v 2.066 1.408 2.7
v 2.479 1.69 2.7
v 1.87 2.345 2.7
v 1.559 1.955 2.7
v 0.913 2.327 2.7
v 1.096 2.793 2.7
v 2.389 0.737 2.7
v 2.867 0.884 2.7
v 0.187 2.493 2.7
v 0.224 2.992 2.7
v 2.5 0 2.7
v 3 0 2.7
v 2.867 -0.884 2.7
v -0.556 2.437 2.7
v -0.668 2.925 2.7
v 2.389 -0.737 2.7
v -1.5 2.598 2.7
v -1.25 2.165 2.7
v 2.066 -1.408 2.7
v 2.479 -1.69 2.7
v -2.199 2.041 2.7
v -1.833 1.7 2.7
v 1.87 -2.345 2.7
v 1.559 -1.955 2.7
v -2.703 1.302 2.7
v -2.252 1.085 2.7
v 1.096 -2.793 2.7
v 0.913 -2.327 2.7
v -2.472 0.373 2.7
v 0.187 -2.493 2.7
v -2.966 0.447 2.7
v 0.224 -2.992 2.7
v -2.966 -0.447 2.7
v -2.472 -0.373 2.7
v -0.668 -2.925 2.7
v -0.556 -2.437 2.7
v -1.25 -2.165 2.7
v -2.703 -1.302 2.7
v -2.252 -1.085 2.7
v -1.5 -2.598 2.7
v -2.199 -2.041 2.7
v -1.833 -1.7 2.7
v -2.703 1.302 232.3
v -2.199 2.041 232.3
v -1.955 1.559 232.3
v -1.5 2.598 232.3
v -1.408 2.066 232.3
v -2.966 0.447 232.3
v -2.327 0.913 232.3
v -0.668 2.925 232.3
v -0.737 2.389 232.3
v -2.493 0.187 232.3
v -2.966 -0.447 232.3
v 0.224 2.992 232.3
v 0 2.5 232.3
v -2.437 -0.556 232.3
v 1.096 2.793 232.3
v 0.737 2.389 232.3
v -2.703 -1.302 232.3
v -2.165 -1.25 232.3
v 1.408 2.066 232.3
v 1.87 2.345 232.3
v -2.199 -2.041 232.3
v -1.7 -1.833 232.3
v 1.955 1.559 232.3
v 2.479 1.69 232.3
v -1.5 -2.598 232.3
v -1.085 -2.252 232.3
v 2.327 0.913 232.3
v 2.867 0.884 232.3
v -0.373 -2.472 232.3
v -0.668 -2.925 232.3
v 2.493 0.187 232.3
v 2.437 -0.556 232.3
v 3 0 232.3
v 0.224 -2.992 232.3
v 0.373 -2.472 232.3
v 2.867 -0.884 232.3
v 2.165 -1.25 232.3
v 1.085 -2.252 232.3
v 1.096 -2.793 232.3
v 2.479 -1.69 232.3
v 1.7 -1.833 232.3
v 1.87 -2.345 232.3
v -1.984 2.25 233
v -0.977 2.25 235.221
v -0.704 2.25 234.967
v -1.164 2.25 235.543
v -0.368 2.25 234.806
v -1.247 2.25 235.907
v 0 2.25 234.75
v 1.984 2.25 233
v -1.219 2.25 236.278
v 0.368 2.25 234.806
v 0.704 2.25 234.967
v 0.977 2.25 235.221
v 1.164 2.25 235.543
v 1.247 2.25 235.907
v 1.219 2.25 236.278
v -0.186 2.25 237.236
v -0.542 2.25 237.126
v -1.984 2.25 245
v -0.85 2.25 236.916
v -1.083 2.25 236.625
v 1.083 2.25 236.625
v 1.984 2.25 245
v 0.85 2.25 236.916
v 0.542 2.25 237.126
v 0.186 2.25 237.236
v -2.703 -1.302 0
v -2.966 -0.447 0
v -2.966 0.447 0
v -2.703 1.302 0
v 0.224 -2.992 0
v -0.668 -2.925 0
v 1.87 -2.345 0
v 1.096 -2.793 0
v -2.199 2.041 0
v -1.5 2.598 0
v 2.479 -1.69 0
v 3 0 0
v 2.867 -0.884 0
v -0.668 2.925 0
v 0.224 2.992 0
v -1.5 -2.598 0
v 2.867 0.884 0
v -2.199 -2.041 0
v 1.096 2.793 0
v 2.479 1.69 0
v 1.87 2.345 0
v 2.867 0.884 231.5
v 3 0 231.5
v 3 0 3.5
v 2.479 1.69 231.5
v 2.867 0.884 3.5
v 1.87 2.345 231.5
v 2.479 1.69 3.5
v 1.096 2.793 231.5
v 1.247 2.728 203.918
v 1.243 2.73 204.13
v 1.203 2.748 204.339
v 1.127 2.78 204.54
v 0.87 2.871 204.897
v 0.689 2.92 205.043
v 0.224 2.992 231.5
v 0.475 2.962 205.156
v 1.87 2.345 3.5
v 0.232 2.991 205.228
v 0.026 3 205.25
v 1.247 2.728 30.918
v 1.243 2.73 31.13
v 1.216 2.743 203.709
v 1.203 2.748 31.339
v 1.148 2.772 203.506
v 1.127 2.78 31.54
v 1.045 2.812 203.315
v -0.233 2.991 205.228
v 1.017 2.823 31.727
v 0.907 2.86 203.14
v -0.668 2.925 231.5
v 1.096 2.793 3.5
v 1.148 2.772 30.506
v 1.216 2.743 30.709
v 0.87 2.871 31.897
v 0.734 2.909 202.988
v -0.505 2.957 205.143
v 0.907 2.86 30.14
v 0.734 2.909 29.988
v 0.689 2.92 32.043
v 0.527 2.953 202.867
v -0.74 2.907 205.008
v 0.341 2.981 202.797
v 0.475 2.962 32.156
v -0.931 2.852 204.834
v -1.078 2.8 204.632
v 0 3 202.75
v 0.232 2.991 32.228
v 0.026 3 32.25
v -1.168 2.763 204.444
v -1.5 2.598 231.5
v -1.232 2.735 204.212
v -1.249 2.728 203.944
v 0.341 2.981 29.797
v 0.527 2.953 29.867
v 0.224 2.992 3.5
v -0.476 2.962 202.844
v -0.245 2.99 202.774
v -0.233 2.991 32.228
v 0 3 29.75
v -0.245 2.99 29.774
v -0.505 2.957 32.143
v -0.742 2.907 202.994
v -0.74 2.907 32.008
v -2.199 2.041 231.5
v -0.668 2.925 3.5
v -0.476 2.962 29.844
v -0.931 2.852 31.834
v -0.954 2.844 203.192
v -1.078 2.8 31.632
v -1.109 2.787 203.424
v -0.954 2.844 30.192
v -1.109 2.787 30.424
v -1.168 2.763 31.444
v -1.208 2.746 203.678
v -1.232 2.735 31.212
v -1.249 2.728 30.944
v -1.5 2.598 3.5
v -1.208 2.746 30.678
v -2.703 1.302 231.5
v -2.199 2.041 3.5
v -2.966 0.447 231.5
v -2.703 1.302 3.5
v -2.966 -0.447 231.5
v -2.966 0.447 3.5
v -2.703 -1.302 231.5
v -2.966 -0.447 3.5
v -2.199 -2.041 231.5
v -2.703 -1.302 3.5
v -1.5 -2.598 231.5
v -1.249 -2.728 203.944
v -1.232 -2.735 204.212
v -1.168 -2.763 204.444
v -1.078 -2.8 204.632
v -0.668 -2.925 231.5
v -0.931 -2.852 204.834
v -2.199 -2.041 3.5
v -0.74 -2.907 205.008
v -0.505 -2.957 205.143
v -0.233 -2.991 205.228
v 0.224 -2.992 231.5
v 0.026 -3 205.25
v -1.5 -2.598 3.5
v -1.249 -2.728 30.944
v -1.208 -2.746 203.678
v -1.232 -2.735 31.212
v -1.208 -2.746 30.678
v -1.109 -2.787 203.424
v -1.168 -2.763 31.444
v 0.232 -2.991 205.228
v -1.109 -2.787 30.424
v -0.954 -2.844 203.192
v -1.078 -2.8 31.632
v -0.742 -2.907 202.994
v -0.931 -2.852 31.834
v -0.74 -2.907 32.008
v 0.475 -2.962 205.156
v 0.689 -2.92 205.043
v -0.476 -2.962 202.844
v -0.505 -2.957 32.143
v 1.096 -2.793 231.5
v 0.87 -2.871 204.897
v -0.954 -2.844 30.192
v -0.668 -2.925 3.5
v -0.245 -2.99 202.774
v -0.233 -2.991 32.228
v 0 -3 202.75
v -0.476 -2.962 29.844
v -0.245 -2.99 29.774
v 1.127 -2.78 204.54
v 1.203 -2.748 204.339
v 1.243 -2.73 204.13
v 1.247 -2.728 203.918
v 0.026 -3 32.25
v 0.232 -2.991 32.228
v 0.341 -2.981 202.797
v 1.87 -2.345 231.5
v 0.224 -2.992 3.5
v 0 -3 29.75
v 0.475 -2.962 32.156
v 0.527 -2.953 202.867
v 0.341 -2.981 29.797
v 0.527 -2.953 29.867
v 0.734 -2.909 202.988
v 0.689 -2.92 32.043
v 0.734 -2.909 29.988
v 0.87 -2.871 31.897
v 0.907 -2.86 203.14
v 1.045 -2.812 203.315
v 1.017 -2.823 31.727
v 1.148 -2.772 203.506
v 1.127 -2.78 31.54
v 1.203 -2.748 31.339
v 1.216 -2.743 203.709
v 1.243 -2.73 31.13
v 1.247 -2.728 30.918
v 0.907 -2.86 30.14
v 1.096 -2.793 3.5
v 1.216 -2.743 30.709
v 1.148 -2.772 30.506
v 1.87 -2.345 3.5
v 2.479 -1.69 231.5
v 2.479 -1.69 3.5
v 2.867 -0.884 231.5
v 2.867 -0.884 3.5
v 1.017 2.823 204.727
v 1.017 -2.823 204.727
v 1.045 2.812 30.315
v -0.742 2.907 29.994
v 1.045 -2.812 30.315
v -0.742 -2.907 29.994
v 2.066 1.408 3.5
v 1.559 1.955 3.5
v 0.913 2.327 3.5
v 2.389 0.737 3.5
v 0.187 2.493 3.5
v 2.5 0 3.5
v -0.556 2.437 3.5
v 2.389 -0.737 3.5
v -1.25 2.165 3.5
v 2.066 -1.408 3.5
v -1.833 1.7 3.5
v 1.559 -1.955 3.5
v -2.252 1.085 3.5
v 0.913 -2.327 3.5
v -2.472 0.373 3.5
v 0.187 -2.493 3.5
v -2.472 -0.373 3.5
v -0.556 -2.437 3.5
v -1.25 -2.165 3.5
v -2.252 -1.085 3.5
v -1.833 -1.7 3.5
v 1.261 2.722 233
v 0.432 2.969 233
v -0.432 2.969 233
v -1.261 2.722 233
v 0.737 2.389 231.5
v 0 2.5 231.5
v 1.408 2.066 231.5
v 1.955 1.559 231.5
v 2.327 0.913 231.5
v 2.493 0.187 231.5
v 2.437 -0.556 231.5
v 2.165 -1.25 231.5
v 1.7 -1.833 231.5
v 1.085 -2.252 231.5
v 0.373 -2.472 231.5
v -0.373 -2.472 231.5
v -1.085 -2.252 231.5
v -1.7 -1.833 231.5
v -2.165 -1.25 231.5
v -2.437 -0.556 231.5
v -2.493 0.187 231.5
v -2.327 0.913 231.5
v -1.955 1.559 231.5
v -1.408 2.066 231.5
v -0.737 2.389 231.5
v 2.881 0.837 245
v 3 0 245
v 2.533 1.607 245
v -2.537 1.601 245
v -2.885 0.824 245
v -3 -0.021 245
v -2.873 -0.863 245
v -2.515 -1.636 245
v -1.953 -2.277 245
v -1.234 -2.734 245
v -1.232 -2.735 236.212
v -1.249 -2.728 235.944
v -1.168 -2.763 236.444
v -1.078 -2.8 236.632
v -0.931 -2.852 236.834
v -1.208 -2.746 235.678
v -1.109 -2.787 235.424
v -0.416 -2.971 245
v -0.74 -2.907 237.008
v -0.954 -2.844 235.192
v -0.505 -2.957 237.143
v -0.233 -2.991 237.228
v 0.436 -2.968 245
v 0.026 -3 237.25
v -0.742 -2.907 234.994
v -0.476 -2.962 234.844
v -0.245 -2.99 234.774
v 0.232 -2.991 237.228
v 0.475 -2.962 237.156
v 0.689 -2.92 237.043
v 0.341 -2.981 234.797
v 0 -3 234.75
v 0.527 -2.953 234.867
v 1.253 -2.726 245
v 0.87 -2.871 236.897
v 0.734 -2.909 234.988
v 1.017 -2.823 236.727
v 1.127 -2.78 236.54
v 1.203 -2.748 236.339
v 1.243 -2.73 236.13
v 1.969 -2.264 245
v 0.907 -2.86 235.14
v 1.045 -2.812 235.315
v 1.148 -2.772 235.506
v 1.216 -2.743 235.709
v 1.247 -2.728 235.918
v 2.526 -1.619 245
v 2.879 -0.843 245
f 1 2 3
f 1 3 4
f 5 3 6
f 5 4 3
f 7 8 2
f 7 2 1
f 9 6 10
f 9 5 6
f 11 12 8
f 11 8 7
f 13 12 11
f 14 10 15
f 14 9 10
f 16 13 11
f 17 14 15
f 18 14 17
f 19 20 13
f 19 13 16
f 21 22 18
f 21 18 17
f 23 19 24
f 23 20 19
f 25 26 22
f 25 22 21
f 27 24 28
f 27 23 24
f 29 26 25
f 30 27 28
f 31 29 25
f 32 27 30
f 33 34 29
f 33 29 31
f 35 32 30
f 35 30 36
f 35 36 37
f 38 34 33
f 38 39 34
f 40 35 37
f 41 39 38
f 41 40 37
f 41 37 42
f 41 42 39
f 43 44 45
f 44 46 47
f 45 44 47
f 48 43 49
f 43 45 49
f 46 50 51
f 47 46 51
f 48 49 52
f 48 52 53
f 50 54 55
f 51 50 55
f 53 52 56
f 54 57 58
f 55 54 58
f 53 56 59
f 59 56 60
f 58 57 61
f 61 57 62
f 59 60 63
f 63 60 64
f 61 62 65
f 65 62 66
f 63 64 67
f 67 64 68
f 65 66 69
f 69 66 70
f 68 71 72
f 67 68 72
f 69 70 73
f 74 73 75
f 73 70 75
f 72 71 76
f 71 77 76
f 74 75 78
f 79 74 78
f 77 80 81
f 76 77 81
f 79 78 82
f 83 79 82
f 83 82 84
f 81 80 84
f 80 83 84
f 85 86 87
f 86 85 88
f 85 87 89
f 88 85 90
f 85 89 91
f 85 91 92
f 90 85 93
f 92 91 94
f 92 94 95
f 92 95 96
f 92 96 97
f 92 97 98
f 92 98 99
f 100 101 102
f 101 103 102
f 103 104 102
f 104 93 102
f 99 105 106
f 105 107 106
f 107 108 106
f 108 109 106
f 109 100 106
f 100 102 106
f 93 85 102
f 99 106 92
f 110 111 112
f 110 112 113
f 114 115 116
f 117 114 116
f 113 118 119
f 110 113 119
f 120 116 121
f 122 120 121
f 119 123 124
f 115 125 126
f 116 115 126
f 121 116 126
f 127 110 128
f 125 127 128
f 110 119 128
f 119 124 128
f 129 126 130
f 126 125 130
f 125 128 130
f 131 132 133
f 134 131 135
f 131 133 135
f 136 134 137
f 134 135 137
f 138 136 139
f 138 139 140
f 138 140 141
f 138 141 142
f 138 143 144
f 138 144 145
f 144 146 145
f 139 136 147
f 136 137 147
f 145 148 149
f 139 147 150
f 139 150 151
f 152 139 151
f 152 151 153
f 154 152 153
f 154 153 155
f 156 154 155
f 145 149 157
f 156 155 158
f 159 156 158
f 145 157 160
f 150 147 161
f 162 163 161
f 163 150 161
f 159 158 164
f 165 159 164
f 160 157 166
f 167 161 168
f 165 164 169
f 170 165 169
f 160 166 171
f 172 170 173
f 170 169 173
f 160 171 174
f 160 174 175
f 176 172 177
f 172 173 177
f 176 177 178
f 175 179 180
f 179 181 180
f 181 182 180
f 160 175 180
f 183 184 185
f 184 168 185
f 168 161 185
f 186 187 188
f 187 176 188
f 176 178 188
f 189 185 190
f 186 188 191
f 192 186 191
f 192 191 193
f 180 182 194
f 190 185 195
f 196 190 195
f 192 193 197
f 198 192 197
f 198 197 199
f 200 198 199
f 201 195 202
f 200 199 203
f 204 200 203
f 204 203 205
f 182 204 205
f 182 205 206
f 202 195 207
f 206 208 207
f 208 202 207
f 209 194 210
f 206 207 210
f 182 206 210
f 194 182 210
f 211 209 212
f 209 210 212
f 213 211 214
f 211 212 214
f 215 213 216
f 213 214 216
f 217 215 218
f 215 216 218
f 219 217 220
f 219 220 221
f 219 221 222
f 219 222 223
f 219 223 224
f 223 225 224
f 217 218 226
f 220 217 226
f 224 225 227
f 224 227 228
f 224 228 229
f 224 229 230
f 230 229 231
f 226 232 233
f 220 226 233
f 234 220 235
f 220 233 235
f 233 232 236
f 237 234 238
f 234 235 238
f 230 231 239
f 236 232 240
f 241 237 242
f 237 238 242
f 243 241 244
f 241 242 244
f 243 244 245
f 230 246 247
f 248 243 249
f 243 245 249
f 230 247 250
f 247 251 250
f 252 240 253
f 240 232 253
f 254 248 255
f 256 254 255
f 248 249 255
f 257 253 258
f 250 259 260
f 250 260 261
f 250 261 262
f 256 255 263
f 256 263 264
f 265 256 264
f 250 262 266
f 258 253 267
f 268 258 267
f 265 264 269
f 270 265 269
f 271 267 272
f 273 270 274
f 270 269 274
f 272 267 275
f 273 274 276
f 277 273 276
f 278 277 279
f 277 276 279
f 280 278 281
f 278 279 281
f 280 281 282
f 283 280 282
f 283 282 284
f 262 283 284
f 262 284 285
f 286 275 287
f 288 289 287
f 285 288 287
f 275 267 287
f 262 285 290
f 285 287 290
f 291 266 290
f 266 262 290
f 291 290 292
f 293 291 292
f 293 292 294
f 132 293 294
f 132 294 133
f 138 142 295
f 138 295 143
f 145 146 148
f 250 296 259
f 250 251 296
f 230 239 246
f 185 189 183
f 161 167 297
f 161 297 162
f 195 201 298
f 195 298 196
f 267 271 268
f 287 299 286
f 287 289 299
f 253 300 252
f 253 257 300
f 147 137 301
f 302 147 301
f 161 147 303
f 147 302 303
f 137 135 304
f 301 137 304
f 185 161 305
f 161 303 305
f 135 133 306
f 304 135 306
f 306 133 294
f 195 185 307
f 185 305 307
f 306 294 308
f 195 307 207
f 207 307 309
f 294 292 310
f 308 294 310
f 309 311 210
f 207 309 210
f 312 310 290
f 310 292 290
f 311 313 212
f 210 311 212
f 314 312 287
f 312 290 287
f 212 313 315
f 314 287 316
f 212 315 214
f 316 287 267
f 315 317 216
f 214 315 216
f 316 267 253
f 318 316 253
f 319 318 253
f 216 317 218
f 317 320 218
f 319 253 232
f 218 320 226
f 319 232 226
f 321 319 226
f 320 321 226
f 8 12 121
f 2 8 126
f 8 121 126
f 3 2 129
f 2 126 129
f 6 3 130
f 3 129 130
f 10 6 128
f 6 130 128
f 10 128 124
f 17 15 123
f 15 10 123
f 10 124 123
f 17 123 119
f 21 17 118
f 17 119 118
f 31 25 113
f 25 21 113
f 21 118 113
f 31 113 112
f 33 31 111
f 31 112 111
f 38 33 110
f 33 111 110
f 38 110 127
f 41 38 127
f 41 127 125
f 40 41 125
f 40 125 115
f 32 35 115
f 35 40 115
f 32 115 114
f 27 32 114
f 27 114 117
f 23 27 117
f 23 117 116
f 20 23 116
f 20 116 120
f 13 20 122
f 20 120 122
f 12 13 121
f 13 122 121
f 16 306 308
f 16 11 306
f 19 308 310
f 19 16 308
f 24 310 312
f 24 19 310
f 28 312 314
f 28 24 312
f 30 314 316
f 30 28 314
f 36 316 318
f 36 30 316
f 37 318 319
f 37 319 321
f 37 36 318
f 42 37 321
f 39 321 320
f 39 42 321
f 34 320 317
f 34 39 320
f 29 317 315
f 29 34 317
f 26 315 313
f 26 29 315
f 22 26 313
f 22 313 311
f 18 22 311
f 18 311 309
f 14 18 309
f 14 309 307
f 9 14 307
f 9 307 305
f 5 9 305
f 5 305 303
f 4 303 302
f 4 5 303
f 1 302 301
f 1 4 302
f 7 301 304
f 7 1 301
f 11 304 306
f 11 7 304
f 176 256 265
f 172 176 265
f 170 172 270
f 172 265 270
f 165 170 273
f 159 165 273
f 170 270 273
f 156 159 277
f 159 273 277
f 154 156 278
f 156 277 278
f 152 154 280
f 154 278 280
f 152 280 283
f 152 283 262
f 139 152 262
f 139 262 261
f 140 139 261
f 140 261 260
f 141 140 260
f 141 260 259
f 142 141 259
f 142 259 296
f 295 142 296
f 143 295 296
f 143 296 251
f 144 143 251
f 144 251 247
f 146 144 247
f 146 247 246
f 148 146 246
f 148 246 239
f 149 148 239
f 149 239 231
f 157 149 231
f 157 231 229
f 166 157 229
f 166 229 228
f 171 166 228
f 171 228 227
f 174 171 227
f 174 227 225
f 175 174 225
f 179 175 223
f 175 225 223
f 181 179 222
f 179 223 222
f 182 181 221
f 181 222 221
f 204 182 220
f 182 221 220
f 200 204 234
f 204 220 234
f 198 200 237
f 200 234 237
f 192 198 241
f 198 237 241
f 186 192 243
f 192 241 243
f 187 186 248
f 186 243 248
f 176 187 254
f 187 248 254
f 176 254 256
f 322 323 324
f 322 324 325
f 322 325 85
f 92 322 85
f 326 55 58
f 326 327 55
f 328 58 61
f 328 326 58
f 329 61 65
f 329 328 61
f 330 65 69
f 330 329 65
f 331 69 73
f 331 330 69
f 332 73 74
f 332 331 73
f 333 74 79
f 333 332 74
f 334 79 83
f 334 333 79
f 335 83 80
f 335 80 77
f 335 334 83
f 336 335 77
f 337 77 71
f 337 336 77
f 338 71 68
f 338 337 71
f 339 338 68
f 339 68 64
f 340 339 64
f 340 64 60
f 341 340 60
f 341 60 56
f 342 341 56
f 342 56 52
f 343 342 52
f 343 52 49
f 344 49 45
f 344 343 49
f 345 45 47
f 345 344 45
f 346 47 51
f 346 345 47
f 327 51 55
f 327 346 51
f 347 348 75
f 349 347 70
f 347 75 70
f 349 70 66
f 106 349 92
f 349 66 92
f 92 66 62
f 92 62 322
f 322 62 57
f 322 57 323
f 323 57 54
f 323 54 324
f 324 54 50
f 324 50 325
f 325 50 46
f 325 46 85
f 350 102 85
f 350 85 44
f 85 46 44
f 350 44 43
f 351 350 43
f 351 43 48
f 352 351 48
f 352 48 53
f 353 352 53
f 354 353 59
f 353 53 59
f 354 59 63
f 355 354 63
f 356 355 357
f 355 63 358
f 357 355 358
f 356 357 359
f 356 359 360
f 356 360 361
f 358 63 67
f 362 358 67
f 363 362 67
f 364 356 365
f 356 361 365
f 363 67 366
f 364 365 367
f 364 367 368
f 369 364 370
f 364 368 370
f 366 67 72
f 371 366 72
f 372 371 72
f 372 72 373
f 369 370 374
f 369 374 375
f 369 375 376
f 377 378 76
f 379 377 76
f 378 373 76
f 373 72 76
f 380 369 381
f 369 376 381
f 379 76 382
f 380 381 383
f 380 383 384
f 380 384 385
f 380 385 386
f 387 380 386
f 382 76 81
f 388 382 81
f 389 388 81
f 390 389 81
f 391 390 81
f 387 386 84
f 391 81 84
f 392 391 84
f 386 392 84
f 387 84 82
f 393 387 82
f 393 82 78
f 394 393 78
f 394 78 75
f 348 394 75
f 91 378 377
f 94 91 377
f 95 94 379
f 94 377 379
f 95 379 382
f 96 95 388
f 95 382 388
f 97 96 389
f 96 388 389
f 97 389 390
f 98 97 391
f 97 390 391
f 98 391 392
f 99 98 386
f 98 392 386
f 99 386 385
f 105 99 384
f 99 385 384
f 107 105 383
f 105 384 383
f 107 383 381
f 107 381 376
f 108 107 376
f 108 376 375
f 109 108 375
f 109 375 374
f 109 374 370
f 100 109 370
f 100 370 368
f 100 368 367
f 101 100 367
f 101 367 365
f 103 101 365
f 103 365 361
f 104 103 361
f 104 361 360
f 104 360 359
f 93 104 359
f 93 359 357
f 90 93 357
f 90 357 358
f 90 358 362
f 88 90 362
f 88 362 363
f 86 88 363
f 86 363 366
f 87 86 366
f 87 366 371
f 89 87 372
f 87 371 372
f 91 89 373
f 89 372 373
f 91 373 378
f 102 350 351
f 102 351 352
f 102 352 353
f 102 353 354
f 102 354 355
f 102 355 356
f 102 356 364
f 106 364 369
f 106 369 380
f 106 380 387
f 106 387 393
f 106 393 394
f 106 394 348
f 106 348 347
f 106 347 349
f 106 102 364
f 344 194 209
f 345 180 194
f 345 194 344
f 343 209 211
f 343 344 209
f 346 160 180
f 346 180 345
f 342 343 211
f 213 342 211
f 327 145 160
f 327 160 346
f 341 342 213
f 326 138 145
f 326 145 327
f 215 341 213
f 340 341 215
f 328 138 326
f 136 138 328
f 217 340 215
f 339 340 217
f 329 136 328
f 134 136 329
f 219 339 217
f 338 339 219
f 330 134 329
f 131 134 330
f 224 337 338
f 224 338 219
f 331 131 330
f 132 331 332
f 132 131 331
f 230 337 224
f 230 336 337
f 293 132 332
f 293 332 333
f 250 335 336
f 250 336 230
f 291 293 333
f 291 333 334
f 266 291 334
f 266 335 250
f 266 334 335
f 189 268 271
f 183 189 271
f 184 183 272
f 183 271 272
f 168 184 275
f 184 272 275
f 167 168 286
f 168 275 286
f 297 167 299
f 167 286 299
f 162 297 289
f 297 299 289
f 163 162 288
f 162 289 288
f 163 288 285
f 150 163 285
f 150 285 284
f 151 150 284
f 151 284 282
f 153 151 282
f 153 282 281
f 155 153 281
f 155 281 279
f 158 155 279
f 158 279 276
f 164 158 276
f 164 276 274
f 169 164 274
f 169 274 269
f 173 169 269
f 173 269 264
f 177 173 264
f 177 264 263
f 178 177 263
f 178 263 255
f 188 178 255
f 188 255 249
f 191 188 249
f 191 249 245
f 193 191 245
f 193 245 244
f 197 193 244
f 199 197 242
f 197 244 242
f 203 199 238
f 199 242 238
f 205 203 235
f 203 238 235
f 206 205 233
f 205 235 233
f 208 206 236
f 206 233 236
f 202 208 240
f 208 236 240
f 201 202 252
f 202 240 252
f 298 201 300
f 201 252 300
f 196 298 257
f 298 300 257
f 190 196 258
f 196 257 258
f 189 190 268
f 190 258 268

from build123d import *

# Parameters (mm, degrees)
SKETCH1_R           = 3
BOSS_EXTRUDE1_DEPTH = 245
CUT_EXTRUDE2_DEPTH  = 12
M3_TAPPED_HOLE6_D   = 2.5
SKETCH24_W          = 0.8
SKETCH24_H          = 0.5
M3_TAPPED_HOLE7_D   = 2.5
SKETCH28_W          = 0.5
SKETCH28_H          = 0.8


with BuildPart() as part:
    # Sketch1 → Boss-Extrude1 (new body)
    with BuildSketch(Plane.XY):
        Circle(SKETCH1_R)
    extrude(amount=BOSS_EXTRUDE1_DEPTH)

    # Sketch21 → Cut-Extrude2 (cut)
    with BuildSketch(Plane.XY.offset(245)):
        with BuildLine():
            Line((-1.984313483, 2.25), (1.984313483, 2.25))
            ThreePointArc((1.984313483, 2.25), (0, 3), (-1.984313483, 2.25))
        make_face()
    extrude(amount=-CUT_EXTRUDE2_DEPTH, mode=Mode.SUBTRACT)

    # M3 Tapped Hole6 (through all)
    with Locations(Plane(origin=(0, 2.25, 236), x_dir=(0, 0, 1), z_dir=(0, 1, 0))):
        with Locations((0, 0)):
            Hole(M3_TAPPED_HOLE6_D / 2)

    # Sketch24 → Cut-Revolve1 (revolve, cut)
    with BuildSketch(Plane(origin=(0, 0, 0), x_dir=(0, 0, -1), z_dir=(1, 0, 0))):
        with Locations((-231.9, 2.75)):
            Rectangle(SKETCH24_W, SKETCH24_H)
    revolve(axis=Axis((0, 0, 245), (0, 0, -1)), mode=Mode.SUBTRACT)

    # M3 Tapped Hole7 (through all)
    with Locations(Plane(origin=(0, 3.25, 204), x_dir=(0, 0, 1), z_dir=(0, 1, 0))):
        with Locations((0, 0), (-173, 0)):
            Hole(M3_TAPPED_HOLE7_D / 2)

    # Sketch28 → Cut-Revolve2 (revolve, cut)
    with BuildSketch(Plane(origin=(0, 0, 0), x_dir=(1, 0, 0), z_dir=(0, 1, 0))):
        with Locations((2.75, -3.1)):
            Rectangle(SKETCH28_W, SKETCH28_H)
    revolve(axis=Axis((0, 0, 245), (0, 0, -1)), mode=Mode.SUBTRACT)


solid = part.part
